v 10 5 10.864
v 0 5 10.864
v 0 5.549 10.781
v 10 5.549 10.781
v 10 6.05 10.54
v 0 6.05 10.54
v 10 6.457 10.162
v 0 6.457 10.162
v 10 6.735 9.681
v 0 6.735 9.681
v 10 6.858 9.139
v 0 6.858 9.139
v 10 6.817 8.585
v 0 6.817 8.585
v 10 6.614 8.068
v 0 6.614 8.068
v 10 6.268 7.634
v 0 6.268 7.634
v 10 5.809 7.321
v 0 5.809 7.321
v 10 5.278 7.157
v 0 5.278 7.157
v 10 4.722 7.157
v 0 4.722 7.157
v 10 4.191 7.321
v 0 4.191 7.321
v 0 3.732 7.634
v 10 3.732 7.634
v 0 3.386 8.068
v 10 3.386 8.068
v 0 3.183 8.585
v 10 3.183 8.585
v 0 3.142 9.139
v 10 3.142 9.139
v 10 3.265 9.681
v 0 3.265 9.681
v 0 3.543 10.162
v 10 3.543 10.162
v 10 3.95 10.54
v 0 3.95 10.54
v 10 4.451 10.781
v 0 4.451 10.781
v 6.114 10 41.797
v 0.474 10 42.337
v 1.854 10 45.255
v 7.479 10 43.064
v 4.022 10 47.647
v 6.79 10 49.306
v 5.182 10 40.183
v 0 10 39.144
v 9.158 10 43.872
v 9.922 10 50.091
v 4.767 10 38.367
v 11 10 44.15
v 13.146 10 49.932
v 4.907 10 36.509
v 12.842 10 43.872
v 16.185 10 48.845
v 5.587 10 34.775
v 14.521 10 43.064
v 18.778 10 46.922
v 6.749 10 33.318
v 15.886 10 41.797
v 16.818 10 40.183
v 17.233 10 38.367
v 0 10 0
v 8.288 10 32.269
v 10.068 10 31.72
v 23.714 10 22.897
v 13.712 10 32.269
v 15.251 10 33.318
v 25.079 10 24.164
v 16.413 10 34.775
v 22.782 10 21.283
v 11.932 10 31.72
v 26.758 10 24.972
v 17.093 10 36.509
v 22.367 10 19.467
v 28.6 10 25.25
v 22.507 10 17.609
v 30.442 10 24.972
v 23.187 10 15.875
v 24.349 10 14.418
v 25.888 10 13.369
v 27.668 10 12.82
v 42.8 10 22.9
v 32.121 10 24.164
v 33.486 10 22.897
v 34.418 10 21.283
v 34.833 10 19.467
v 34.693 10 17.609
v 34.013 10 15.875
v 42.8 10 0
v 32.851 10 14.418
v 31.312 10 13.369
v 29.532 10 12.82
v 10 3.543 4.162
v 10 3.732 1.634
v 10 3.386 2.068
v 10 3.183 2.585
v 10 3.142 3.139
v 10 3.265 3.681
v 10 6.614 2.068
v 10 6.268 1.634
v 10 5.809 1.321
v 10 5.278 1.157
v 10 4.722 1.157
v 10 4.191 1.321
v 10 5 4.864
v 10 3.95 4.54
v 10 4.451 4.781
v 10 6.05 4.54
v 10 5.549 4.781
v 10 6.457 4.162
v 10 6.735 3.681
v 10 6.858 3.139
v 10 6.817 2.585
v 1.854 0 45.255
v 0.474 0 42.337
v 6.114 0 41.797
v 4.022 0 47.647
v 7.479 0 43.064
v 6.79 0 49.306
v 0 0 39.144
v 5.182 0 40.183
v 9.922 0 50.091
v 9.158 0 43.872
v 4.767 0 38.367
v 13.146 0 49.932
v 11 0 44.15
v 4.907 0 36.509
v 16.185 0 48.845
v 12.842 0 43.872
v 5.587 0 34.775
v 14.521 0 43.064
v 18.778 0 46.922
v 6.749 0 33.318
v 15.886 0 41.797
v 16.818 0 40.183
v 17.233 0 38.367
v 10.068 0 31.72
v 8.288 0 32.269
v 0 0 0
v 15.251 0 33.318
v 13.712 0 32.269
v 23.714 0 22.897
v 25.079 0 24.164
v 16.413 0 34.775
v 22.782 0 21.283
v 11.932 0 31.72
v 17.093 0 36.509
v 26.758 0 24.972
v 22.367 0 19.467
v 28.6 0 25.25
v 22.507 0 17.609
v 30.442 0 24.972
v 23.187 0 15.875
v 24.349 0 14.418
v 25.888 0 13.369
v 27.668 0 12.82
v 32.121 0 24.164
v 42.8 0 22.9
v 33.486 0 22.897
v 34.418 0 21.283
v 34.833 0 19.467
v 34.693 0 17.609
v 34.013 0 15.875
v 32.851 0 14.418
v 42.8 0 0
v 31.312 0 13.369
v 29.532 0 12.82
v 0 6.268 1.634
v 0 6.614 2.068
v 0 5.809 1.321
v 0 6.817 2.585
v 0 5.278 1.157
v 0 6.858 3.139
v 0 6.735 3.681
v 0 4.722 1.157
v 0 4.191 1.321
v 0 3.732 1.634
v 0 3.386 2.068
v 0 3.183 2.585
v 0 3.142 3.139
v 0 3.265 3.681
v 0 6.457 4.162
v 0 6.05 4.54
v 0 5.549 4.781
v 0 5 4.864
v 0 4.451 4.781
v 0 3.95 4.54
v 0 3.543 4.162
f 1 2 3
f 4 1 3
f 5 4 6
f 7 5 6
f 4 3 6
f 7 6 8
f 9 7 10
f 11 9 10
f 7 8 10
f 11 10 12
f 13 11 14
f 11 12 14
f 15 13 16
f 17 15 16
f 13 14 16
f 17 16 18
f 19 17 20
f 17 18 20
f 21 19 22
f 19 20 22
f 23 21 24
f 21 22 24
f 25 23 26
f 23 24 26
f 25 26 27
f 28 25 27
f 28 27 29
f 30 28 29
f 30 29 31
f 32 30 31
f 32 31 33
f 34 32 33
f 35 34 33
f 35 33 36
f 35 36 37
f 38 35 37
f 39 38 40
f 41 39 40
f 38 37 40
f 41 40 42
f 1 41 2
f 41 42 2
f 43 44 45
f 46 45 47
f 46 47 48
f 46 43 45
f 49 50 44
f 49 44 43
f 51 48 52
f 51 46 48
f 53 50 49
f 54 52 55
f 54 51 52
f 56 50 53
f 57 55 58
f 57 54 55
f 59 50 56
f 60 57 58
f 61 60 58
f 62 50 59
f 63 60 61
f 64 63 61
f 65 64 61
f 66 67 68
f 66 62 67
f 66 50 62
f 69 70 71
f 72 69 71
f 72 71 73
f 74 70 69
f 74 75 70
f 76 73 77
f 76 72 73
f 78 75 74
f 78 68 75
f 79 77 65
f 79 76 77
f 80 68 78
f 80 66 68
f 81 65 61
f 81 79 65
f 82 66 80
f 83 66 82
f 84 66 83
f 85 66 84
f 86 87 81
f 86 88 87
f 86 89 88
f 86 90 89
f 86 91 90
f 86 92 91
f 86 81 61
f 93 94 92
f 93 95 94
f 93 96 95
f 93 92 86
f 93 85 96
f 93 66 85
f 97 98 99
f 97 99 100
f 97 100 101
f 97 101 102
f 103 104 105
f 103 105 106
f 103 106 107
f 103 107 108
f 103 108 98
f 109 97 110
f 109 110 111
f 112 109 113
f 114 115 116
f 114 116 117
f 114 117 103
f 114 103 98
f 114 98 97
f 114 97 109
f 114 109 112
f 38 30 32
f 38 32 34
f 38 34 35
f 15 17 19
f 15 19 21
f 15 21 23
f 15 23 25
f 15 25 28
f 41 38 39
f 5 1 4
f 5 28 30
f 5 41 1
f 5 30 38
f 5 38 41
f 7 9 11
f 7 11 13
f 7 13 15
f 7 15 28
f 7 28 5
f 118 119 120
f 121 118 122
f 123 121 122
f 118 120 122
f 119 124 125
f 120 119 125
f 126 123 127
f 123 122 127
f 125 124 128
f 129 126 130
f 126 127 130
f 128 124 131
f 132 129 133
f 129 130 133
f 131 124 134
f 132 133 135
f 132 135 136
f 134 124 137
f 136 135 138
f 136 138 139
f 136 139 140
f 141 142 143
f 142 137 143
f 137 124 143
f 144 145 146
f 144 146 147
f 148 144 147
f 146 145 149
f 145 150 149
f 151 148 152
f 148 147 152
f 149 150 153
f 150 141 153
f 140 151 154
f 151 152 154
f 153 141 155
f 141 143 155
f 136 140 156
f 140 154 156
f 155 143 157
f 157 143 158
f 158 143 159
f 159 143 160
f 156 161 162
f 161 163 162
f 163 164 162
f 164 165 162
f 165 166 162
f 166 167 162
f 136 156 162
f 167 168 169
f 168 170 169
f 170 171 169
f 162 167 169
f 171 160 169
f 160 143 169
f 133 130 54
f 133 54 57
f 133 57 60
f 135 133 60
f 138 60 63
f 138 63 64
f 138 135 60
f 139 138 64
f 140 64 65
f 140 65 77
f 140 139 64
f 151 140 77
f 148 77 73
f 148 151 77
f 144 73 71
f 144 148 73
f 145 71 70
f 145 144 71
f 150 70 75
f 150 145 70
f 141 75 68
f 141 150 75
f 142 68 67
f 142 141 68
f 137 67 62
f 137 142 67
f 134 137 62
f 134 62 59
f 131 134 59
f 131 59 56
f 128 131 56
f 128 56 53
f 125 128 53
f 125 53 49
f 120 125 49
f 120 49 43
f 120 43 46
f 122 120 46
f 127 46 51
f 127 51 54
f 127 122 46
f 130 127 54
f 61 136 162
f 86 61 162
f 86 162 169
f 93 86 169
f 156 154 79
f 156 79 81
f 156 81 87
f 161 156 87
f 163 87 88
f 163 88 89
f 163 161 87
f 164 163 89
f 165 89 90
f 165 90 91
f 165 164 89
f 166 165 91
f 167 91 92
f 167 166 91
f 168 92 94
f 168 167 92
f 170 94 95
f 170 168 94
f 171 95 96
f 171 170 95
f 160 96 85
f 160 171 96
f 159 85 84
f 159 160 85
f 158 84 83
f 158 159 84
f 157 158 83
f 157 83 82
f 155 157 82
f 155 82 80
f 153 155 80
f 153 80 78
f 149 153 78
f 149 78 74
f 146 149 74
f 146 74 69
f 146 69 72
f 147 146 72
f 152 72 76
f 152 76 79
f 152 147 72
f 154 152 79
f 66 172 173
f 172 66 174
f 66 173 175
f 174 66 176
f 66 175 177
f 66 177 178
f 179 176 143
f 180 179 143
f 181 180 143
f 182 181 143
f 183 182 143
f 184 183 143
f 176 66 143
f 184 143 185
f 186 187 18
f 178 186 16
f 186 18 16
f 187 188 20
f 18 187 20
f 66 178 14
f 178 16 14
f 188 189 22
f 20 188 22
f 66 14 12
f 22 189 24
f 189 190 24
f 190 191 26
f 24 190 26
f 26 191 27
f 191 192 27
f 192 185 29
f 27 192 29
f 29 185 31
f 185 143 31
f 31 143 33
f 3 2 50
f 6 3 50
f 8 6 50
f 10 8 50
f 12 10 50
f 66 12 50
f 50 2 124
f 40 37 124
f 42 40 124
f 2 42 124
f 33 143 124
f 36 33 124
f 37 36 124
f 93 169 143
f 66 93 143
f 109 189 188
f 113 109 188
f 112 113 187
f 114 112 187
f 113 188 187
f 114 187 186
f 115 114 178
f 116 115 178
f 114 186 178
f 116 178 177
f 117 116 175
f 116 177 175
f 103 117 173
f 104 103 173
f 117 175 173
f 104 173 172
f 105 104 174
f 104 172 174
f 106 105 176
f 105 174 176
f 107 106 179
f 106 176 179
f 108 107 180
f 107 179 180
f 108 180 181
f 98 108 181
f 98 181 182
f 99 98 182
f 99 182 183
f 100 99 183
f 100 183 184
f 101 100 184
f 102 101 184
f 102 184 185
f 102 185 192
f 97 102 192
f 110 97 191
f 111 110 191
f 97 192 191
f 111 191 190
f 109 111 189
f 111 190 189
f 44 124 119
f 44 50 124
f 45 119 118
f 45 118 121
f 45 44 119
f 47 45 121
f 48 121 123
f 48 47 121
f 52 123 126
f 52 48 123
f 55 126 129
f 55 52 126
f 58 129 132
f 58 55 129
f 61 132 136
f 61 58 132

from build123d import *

# Parameters (mm, degrees)
SCHIZZO1_R                   = 6.25
ESTRUSIONE_ESTRUSIONE1_DEPTH = 10
RACCORDO1_R                  = 11
SCHIZZO2_R                   = 1.863588926
TAGLIO_ESTRUSIONE1_DEPTH     = 10


with BuildPart() as part:
    # Schizzo1 → Estrusione-Estrusione1 (new body)
    with BuildSketch(Plane(origin=(0, 0, 0), x_dir=(1, 0, 0), z_dir=(0, 1, 0))):
        Polygon((0, 0), (0, -37.9), (0, -65.7), (42.8, -22.9), (42.8, 0), align=None)
        with Locations(Location((11, -37.9, 0), (0, 0, 270))):
            Circle(SCHIZZO1_R, mode=Mode.SUBTRACT)
        with Locations(Location((28.6, -19, 0), (0, 0, 270))):
            Circle(SCHIZZO1_R, mode=Mode.SUBTRACT)
    extrude(amount=ESTRUSIONE_ESTRUSIONE1_DEPTH)

    # Raccordo1
    raccordo1_edges = [part.edges().sort_by_distance(p)[0] for p in [
        (0, 5, 65.7),
    ]]
    fillet(raccordo1_edges, radius=RACCORDO1_R)

    # Schizzo2 → Taglio-Estrusione1 (cut)
    with BuildSketch(Plane.ZY):
        with Locations((3, 5)):
            Circle(SCHIZZO2_R)
        with Locations((9, 5)):
            Circle(SCHIZZO2_R)
    extrude(amount=-TAGLIO_ESTRUSIONE1_DEPTH, mode=Mode.SUBTRACT)


solid = part.part
